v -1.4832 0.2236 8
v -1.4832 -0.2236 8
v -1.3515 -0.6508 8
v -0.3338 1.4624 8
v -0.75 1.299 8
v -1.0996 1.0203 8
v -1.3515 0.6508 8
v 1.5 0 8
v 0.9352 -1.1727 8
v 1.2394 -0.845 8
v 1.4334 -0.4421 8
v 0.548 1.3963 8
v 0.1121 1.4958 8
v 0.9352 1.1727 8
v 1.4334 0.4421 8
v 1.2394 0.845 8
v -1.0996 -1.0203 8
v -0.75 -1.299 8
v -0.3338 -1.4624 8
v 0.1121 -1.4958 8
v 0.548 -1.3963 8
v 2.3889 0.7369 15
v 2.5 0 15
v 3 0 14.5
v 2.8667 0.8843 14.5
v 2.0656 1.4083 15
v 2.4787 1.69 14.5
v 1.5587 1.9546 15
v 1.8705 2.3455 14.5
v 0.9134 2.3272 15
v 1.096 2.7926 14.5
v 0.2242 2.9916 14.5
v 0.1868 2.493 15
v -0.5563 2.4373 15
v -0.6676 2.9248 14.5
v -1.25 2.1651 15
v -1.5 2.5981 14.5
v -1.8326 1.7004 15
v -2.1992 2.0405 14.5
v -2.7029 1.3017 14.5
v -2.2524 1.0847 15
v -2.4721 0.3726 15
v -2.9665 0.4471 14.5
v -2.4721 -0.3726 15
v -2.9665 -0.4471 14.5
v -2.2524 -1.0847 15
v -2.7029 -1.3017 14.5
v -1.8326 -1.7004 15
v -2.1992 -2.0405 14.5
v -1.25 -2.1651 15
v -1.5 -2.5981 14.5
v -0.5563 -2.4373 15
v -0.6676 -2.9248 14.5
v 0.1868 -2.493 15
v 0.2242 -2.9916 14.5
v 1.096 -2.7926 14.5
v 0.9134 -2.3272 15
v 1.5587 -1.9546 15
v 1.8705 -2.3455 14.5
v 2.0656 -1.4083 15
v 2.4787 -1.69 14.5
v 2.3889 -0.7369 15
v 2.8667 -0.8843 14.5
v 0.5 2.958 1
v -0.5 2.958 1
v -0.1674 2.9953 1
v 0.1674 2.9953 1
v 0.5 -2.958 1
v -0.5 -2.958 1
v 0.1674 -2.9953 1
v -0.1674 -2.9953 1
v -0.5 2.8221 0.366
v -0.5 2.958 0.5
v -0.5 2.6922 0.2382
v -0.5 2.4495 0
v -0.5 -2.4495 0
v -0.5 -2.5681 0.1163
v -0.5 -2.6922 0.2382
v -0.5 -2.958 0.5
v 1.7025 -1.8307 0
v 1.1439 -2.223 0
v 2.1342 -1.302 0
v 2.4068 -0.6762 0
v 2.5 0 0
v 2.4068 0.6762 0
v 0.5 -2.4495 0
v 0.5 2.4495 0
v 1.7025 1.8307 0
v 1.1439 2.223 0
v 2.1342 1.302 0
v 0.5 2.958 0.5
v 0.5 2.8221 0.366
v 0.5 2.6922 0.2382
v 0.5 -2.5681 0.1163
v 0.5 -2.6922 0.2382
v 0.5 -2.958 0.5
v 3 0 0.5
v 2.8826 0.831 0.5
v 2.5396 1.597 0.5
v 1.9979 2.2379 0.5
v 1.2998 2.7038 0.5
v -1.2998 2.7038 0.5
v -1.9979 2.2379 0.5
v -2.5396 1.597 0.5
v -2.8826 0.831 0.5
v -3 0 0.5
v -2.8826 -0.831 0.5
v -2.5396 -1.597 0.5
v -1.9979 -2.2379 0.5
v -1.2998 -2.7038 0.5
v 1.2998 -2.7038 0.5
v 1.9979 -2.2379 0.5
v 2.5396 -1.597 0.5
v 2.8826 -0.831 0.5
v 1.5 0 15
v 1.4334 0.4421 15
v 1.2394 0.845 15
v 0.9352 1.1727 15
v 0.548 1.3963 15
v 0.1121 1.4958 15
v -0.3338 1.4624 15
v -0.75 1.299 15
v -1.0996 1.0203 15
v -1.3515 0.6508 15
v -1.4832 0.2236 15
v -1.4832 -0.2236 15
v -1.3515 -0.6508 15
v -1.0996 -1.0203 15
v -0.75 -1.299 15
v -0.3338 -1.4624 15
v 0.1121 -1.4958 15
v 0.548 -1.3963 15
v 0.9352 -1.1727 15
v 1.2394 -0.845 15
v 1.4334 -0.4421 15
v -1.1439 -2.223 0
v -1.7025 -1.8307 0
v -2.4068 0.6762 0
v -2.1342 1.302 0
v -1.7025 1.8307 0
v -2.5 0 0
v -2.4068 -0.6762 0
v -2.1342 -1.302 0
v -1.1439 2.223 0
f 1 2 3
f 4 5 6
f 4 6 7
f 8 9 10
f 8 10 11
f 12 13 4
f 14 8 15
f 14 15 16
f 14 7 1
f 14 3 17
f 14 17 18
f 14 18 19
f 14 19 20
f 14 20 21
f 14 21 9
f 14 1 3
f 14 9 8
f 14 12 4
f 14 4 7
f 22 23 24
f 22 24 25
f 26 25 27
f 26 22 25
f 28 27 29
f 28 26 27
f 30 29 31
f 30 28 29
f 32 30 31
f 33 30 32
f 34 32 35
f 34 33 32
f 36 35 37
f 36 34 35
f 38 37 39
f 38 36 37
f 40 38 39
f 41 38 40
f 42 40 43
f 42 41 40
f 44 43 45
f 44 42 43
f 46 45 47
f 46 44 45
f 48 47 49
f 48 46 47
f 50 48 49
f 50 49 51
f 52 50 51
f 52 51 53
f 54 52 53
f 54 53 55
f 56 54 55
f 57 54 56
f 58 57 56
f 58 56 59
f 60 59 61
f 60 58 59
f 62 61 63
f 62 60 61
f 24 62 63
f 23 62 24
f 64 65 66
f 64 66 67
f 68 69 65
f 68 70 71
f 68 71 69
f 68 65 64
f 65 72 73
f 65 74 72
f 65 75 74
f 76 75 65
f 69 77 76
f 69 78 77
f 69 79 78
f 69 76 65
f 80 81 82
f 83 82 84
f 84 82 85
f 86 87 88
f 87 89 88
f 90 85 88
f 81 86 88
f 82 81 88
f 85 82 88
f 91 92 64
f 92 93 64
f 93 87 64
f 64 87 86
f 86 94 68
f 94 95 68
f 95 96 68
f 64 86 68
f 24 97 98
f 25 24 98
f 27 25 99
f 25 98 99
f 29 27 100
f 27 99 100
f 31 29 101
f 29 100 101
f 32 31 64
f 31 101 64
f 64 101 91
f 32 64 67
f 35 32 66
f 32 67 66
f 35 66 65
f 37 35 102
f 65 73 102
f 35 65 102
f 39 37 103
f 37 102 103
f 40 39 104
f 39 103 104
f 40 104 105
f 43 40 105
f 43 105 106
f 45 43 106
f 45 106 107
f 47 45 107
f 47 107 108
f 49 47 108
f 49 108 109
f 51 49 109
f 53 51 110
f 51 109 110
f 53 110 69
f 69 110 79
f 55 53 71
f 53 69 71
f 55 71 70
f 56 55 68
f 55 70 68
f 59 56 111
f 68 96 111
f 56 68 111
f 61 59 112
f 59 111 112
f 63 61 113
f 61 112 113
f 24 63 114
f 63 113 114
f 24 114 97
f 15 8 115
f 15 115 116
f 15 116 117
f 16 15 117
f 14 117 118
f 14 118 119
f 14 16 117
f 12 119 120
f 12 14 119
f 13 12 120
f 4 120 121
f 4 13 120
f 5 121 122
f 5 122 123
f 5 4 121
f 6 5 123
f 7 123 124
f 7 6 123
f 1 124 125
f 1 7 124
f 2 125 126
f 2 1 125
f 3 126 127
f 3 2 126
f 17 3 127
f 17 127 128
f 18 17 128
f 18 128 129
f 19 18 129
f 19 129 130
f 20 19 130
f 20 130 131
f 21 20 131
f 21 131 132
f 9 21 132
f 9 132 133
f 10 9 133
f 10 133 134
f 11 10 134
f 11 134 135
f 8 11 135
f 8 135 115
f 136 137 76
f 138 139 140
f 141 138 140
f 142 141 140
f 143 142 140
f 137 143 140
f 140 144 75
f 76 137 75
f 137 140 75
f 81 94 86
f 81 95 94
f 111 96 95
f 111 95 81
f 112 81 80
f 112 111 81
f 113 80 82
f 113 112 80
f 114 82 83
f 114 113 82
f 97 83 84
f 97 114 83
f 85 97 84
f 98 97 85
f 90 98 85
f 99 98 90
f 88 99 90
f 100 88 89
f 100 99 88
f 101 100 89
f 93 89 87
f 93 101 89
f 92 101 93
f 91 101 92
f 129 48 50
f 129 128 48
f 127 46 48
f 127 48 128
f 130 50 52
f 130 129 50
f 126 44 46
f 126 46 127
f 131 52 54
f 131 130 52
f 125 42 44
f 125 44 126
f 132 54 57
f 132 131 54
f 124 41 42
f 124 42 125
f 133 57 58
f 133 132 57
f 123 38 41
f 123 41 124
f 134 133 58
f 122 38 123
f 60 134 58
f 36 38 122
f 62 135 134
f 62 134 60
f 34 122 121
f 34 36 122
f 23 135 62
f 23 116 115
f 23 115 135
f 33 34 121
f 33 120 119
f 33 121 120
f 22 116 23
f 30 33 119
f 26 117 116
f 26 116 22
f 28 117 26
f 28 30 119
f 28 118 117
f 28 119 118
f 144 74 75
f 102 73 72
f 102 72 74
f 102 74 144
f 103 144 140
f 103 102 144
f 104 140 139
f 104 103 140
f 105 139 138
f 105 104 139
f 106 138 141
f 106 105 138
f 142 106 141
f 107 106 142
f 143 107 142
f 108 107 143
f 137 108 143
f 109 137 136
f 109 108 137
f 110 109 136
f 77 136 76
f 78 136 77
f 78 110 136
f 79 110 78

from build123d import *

# Parameters (mm, degrees)
F0_R     = 3
F0_R_2   = 1.5
F1_DEPTH = 15
F2_DEPTH = 8
F3_SIZE  = 0.5
F4_W     = 1
F4_H     = 2
F5_DEPTH = 12.5


with BuildPart() as f1:
    # F0 (on Top) → F1 (new body)
    with BuildSketch(Plane.XY):
        Circle(F0_R)
        Circle(F0_R_2, mode=Mode.SUBTRACT)
    extrude(amount=F1_DEPTH)

    # F0 (on Top) → F2 (join)
    with BuildSketch(Plane.XY):
        Circle(F0_R_2)
    extrude(amount=F2_DEPTH)

    # F3
    f3_edges = [f1.edges().sort_by_distance(p)[0] for p in [
        (-3, 0, 0),
        (-3, 0, 15),
    ]]
    chamfer(f3_edges, length=F3_SIZE)

    # F4 (on Front) → F5 (cut, symmetric)
    with BuildSketch(Plane.XZ):
        Rectangle(F4_W, F4_H)
    extrude(amount=F5_DEPTH, both=True, mode=Mode.SUBTRACT)


solid = f1.part
